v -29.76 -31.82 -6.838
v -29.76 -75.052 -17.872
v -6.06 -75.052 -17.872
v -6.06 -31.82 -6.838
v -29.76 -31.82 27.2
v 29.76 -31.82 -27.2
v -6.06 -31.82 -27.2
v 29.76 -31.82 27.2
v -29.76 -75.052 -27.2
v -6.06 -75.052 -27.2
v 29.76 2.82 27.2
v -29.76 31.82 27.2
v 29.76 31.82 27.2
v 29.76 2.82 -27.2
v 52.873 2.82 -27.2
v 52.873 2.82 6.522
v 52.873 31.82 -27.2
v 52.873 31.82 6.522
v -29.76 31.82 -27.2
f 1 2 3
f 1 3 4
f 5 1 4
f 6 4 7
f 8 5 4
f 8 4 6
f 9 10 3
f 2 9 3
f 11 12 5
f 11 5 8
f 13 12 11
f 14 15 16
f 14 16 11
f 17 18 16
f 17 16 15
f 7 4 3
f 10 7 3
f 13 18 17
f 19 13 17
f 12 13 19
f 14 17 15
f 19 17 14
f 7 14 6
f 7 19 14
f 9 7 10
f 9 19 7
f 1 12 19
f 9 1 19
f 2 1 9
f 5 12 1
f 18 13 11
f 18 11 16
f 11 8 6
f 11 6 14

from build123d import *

# Parameters (mm, degrees)
F0_W     = 59.5203563571
F0_H     = 63.6409893632
F1_DEPTH = 27.2
F3_DEPTH = 29
F5_DEPTH = 23.7


with BuildPart() as f1:
    # F0 (on Top) → F1 (new body, symmetric)
    with BuildSketch(Plane.XY):
        Rectangle(F0_W, F0_H)
    extrude(amount=F1_DEPTH, both=True)

    # F2 (on face) → F3 (join)
    with BuildSketch(Plane(origin=(0, 31.8204946816, 0), x_dir=(-1, 0, 0), z_dir=(0, 1, 0))):
        Polygon((-29.7601781785, -27.2), (-29.7601781785, 27.2), (-52.8728328645, 6.5217590891), (-52.8728328645, -27.2), align=None)
    extrude(amount=-F3_DEPTH)

    # F4 (on face) → F5 (join)
    with BuildSketch(Plane(origin=(-29.7601781785, 0, 0), x_dir=(0, -1, 0), z_dir=(-1, 0, 0))):
        Polygon((31.8204946816, -6.837928202), (31.8204946816, -27.2), (75.0524103642, -27.2), (75.0524103642, -17.8717095405), align=None)
    extrude(amount=-F5_DEPTH)


solid = f1.part
